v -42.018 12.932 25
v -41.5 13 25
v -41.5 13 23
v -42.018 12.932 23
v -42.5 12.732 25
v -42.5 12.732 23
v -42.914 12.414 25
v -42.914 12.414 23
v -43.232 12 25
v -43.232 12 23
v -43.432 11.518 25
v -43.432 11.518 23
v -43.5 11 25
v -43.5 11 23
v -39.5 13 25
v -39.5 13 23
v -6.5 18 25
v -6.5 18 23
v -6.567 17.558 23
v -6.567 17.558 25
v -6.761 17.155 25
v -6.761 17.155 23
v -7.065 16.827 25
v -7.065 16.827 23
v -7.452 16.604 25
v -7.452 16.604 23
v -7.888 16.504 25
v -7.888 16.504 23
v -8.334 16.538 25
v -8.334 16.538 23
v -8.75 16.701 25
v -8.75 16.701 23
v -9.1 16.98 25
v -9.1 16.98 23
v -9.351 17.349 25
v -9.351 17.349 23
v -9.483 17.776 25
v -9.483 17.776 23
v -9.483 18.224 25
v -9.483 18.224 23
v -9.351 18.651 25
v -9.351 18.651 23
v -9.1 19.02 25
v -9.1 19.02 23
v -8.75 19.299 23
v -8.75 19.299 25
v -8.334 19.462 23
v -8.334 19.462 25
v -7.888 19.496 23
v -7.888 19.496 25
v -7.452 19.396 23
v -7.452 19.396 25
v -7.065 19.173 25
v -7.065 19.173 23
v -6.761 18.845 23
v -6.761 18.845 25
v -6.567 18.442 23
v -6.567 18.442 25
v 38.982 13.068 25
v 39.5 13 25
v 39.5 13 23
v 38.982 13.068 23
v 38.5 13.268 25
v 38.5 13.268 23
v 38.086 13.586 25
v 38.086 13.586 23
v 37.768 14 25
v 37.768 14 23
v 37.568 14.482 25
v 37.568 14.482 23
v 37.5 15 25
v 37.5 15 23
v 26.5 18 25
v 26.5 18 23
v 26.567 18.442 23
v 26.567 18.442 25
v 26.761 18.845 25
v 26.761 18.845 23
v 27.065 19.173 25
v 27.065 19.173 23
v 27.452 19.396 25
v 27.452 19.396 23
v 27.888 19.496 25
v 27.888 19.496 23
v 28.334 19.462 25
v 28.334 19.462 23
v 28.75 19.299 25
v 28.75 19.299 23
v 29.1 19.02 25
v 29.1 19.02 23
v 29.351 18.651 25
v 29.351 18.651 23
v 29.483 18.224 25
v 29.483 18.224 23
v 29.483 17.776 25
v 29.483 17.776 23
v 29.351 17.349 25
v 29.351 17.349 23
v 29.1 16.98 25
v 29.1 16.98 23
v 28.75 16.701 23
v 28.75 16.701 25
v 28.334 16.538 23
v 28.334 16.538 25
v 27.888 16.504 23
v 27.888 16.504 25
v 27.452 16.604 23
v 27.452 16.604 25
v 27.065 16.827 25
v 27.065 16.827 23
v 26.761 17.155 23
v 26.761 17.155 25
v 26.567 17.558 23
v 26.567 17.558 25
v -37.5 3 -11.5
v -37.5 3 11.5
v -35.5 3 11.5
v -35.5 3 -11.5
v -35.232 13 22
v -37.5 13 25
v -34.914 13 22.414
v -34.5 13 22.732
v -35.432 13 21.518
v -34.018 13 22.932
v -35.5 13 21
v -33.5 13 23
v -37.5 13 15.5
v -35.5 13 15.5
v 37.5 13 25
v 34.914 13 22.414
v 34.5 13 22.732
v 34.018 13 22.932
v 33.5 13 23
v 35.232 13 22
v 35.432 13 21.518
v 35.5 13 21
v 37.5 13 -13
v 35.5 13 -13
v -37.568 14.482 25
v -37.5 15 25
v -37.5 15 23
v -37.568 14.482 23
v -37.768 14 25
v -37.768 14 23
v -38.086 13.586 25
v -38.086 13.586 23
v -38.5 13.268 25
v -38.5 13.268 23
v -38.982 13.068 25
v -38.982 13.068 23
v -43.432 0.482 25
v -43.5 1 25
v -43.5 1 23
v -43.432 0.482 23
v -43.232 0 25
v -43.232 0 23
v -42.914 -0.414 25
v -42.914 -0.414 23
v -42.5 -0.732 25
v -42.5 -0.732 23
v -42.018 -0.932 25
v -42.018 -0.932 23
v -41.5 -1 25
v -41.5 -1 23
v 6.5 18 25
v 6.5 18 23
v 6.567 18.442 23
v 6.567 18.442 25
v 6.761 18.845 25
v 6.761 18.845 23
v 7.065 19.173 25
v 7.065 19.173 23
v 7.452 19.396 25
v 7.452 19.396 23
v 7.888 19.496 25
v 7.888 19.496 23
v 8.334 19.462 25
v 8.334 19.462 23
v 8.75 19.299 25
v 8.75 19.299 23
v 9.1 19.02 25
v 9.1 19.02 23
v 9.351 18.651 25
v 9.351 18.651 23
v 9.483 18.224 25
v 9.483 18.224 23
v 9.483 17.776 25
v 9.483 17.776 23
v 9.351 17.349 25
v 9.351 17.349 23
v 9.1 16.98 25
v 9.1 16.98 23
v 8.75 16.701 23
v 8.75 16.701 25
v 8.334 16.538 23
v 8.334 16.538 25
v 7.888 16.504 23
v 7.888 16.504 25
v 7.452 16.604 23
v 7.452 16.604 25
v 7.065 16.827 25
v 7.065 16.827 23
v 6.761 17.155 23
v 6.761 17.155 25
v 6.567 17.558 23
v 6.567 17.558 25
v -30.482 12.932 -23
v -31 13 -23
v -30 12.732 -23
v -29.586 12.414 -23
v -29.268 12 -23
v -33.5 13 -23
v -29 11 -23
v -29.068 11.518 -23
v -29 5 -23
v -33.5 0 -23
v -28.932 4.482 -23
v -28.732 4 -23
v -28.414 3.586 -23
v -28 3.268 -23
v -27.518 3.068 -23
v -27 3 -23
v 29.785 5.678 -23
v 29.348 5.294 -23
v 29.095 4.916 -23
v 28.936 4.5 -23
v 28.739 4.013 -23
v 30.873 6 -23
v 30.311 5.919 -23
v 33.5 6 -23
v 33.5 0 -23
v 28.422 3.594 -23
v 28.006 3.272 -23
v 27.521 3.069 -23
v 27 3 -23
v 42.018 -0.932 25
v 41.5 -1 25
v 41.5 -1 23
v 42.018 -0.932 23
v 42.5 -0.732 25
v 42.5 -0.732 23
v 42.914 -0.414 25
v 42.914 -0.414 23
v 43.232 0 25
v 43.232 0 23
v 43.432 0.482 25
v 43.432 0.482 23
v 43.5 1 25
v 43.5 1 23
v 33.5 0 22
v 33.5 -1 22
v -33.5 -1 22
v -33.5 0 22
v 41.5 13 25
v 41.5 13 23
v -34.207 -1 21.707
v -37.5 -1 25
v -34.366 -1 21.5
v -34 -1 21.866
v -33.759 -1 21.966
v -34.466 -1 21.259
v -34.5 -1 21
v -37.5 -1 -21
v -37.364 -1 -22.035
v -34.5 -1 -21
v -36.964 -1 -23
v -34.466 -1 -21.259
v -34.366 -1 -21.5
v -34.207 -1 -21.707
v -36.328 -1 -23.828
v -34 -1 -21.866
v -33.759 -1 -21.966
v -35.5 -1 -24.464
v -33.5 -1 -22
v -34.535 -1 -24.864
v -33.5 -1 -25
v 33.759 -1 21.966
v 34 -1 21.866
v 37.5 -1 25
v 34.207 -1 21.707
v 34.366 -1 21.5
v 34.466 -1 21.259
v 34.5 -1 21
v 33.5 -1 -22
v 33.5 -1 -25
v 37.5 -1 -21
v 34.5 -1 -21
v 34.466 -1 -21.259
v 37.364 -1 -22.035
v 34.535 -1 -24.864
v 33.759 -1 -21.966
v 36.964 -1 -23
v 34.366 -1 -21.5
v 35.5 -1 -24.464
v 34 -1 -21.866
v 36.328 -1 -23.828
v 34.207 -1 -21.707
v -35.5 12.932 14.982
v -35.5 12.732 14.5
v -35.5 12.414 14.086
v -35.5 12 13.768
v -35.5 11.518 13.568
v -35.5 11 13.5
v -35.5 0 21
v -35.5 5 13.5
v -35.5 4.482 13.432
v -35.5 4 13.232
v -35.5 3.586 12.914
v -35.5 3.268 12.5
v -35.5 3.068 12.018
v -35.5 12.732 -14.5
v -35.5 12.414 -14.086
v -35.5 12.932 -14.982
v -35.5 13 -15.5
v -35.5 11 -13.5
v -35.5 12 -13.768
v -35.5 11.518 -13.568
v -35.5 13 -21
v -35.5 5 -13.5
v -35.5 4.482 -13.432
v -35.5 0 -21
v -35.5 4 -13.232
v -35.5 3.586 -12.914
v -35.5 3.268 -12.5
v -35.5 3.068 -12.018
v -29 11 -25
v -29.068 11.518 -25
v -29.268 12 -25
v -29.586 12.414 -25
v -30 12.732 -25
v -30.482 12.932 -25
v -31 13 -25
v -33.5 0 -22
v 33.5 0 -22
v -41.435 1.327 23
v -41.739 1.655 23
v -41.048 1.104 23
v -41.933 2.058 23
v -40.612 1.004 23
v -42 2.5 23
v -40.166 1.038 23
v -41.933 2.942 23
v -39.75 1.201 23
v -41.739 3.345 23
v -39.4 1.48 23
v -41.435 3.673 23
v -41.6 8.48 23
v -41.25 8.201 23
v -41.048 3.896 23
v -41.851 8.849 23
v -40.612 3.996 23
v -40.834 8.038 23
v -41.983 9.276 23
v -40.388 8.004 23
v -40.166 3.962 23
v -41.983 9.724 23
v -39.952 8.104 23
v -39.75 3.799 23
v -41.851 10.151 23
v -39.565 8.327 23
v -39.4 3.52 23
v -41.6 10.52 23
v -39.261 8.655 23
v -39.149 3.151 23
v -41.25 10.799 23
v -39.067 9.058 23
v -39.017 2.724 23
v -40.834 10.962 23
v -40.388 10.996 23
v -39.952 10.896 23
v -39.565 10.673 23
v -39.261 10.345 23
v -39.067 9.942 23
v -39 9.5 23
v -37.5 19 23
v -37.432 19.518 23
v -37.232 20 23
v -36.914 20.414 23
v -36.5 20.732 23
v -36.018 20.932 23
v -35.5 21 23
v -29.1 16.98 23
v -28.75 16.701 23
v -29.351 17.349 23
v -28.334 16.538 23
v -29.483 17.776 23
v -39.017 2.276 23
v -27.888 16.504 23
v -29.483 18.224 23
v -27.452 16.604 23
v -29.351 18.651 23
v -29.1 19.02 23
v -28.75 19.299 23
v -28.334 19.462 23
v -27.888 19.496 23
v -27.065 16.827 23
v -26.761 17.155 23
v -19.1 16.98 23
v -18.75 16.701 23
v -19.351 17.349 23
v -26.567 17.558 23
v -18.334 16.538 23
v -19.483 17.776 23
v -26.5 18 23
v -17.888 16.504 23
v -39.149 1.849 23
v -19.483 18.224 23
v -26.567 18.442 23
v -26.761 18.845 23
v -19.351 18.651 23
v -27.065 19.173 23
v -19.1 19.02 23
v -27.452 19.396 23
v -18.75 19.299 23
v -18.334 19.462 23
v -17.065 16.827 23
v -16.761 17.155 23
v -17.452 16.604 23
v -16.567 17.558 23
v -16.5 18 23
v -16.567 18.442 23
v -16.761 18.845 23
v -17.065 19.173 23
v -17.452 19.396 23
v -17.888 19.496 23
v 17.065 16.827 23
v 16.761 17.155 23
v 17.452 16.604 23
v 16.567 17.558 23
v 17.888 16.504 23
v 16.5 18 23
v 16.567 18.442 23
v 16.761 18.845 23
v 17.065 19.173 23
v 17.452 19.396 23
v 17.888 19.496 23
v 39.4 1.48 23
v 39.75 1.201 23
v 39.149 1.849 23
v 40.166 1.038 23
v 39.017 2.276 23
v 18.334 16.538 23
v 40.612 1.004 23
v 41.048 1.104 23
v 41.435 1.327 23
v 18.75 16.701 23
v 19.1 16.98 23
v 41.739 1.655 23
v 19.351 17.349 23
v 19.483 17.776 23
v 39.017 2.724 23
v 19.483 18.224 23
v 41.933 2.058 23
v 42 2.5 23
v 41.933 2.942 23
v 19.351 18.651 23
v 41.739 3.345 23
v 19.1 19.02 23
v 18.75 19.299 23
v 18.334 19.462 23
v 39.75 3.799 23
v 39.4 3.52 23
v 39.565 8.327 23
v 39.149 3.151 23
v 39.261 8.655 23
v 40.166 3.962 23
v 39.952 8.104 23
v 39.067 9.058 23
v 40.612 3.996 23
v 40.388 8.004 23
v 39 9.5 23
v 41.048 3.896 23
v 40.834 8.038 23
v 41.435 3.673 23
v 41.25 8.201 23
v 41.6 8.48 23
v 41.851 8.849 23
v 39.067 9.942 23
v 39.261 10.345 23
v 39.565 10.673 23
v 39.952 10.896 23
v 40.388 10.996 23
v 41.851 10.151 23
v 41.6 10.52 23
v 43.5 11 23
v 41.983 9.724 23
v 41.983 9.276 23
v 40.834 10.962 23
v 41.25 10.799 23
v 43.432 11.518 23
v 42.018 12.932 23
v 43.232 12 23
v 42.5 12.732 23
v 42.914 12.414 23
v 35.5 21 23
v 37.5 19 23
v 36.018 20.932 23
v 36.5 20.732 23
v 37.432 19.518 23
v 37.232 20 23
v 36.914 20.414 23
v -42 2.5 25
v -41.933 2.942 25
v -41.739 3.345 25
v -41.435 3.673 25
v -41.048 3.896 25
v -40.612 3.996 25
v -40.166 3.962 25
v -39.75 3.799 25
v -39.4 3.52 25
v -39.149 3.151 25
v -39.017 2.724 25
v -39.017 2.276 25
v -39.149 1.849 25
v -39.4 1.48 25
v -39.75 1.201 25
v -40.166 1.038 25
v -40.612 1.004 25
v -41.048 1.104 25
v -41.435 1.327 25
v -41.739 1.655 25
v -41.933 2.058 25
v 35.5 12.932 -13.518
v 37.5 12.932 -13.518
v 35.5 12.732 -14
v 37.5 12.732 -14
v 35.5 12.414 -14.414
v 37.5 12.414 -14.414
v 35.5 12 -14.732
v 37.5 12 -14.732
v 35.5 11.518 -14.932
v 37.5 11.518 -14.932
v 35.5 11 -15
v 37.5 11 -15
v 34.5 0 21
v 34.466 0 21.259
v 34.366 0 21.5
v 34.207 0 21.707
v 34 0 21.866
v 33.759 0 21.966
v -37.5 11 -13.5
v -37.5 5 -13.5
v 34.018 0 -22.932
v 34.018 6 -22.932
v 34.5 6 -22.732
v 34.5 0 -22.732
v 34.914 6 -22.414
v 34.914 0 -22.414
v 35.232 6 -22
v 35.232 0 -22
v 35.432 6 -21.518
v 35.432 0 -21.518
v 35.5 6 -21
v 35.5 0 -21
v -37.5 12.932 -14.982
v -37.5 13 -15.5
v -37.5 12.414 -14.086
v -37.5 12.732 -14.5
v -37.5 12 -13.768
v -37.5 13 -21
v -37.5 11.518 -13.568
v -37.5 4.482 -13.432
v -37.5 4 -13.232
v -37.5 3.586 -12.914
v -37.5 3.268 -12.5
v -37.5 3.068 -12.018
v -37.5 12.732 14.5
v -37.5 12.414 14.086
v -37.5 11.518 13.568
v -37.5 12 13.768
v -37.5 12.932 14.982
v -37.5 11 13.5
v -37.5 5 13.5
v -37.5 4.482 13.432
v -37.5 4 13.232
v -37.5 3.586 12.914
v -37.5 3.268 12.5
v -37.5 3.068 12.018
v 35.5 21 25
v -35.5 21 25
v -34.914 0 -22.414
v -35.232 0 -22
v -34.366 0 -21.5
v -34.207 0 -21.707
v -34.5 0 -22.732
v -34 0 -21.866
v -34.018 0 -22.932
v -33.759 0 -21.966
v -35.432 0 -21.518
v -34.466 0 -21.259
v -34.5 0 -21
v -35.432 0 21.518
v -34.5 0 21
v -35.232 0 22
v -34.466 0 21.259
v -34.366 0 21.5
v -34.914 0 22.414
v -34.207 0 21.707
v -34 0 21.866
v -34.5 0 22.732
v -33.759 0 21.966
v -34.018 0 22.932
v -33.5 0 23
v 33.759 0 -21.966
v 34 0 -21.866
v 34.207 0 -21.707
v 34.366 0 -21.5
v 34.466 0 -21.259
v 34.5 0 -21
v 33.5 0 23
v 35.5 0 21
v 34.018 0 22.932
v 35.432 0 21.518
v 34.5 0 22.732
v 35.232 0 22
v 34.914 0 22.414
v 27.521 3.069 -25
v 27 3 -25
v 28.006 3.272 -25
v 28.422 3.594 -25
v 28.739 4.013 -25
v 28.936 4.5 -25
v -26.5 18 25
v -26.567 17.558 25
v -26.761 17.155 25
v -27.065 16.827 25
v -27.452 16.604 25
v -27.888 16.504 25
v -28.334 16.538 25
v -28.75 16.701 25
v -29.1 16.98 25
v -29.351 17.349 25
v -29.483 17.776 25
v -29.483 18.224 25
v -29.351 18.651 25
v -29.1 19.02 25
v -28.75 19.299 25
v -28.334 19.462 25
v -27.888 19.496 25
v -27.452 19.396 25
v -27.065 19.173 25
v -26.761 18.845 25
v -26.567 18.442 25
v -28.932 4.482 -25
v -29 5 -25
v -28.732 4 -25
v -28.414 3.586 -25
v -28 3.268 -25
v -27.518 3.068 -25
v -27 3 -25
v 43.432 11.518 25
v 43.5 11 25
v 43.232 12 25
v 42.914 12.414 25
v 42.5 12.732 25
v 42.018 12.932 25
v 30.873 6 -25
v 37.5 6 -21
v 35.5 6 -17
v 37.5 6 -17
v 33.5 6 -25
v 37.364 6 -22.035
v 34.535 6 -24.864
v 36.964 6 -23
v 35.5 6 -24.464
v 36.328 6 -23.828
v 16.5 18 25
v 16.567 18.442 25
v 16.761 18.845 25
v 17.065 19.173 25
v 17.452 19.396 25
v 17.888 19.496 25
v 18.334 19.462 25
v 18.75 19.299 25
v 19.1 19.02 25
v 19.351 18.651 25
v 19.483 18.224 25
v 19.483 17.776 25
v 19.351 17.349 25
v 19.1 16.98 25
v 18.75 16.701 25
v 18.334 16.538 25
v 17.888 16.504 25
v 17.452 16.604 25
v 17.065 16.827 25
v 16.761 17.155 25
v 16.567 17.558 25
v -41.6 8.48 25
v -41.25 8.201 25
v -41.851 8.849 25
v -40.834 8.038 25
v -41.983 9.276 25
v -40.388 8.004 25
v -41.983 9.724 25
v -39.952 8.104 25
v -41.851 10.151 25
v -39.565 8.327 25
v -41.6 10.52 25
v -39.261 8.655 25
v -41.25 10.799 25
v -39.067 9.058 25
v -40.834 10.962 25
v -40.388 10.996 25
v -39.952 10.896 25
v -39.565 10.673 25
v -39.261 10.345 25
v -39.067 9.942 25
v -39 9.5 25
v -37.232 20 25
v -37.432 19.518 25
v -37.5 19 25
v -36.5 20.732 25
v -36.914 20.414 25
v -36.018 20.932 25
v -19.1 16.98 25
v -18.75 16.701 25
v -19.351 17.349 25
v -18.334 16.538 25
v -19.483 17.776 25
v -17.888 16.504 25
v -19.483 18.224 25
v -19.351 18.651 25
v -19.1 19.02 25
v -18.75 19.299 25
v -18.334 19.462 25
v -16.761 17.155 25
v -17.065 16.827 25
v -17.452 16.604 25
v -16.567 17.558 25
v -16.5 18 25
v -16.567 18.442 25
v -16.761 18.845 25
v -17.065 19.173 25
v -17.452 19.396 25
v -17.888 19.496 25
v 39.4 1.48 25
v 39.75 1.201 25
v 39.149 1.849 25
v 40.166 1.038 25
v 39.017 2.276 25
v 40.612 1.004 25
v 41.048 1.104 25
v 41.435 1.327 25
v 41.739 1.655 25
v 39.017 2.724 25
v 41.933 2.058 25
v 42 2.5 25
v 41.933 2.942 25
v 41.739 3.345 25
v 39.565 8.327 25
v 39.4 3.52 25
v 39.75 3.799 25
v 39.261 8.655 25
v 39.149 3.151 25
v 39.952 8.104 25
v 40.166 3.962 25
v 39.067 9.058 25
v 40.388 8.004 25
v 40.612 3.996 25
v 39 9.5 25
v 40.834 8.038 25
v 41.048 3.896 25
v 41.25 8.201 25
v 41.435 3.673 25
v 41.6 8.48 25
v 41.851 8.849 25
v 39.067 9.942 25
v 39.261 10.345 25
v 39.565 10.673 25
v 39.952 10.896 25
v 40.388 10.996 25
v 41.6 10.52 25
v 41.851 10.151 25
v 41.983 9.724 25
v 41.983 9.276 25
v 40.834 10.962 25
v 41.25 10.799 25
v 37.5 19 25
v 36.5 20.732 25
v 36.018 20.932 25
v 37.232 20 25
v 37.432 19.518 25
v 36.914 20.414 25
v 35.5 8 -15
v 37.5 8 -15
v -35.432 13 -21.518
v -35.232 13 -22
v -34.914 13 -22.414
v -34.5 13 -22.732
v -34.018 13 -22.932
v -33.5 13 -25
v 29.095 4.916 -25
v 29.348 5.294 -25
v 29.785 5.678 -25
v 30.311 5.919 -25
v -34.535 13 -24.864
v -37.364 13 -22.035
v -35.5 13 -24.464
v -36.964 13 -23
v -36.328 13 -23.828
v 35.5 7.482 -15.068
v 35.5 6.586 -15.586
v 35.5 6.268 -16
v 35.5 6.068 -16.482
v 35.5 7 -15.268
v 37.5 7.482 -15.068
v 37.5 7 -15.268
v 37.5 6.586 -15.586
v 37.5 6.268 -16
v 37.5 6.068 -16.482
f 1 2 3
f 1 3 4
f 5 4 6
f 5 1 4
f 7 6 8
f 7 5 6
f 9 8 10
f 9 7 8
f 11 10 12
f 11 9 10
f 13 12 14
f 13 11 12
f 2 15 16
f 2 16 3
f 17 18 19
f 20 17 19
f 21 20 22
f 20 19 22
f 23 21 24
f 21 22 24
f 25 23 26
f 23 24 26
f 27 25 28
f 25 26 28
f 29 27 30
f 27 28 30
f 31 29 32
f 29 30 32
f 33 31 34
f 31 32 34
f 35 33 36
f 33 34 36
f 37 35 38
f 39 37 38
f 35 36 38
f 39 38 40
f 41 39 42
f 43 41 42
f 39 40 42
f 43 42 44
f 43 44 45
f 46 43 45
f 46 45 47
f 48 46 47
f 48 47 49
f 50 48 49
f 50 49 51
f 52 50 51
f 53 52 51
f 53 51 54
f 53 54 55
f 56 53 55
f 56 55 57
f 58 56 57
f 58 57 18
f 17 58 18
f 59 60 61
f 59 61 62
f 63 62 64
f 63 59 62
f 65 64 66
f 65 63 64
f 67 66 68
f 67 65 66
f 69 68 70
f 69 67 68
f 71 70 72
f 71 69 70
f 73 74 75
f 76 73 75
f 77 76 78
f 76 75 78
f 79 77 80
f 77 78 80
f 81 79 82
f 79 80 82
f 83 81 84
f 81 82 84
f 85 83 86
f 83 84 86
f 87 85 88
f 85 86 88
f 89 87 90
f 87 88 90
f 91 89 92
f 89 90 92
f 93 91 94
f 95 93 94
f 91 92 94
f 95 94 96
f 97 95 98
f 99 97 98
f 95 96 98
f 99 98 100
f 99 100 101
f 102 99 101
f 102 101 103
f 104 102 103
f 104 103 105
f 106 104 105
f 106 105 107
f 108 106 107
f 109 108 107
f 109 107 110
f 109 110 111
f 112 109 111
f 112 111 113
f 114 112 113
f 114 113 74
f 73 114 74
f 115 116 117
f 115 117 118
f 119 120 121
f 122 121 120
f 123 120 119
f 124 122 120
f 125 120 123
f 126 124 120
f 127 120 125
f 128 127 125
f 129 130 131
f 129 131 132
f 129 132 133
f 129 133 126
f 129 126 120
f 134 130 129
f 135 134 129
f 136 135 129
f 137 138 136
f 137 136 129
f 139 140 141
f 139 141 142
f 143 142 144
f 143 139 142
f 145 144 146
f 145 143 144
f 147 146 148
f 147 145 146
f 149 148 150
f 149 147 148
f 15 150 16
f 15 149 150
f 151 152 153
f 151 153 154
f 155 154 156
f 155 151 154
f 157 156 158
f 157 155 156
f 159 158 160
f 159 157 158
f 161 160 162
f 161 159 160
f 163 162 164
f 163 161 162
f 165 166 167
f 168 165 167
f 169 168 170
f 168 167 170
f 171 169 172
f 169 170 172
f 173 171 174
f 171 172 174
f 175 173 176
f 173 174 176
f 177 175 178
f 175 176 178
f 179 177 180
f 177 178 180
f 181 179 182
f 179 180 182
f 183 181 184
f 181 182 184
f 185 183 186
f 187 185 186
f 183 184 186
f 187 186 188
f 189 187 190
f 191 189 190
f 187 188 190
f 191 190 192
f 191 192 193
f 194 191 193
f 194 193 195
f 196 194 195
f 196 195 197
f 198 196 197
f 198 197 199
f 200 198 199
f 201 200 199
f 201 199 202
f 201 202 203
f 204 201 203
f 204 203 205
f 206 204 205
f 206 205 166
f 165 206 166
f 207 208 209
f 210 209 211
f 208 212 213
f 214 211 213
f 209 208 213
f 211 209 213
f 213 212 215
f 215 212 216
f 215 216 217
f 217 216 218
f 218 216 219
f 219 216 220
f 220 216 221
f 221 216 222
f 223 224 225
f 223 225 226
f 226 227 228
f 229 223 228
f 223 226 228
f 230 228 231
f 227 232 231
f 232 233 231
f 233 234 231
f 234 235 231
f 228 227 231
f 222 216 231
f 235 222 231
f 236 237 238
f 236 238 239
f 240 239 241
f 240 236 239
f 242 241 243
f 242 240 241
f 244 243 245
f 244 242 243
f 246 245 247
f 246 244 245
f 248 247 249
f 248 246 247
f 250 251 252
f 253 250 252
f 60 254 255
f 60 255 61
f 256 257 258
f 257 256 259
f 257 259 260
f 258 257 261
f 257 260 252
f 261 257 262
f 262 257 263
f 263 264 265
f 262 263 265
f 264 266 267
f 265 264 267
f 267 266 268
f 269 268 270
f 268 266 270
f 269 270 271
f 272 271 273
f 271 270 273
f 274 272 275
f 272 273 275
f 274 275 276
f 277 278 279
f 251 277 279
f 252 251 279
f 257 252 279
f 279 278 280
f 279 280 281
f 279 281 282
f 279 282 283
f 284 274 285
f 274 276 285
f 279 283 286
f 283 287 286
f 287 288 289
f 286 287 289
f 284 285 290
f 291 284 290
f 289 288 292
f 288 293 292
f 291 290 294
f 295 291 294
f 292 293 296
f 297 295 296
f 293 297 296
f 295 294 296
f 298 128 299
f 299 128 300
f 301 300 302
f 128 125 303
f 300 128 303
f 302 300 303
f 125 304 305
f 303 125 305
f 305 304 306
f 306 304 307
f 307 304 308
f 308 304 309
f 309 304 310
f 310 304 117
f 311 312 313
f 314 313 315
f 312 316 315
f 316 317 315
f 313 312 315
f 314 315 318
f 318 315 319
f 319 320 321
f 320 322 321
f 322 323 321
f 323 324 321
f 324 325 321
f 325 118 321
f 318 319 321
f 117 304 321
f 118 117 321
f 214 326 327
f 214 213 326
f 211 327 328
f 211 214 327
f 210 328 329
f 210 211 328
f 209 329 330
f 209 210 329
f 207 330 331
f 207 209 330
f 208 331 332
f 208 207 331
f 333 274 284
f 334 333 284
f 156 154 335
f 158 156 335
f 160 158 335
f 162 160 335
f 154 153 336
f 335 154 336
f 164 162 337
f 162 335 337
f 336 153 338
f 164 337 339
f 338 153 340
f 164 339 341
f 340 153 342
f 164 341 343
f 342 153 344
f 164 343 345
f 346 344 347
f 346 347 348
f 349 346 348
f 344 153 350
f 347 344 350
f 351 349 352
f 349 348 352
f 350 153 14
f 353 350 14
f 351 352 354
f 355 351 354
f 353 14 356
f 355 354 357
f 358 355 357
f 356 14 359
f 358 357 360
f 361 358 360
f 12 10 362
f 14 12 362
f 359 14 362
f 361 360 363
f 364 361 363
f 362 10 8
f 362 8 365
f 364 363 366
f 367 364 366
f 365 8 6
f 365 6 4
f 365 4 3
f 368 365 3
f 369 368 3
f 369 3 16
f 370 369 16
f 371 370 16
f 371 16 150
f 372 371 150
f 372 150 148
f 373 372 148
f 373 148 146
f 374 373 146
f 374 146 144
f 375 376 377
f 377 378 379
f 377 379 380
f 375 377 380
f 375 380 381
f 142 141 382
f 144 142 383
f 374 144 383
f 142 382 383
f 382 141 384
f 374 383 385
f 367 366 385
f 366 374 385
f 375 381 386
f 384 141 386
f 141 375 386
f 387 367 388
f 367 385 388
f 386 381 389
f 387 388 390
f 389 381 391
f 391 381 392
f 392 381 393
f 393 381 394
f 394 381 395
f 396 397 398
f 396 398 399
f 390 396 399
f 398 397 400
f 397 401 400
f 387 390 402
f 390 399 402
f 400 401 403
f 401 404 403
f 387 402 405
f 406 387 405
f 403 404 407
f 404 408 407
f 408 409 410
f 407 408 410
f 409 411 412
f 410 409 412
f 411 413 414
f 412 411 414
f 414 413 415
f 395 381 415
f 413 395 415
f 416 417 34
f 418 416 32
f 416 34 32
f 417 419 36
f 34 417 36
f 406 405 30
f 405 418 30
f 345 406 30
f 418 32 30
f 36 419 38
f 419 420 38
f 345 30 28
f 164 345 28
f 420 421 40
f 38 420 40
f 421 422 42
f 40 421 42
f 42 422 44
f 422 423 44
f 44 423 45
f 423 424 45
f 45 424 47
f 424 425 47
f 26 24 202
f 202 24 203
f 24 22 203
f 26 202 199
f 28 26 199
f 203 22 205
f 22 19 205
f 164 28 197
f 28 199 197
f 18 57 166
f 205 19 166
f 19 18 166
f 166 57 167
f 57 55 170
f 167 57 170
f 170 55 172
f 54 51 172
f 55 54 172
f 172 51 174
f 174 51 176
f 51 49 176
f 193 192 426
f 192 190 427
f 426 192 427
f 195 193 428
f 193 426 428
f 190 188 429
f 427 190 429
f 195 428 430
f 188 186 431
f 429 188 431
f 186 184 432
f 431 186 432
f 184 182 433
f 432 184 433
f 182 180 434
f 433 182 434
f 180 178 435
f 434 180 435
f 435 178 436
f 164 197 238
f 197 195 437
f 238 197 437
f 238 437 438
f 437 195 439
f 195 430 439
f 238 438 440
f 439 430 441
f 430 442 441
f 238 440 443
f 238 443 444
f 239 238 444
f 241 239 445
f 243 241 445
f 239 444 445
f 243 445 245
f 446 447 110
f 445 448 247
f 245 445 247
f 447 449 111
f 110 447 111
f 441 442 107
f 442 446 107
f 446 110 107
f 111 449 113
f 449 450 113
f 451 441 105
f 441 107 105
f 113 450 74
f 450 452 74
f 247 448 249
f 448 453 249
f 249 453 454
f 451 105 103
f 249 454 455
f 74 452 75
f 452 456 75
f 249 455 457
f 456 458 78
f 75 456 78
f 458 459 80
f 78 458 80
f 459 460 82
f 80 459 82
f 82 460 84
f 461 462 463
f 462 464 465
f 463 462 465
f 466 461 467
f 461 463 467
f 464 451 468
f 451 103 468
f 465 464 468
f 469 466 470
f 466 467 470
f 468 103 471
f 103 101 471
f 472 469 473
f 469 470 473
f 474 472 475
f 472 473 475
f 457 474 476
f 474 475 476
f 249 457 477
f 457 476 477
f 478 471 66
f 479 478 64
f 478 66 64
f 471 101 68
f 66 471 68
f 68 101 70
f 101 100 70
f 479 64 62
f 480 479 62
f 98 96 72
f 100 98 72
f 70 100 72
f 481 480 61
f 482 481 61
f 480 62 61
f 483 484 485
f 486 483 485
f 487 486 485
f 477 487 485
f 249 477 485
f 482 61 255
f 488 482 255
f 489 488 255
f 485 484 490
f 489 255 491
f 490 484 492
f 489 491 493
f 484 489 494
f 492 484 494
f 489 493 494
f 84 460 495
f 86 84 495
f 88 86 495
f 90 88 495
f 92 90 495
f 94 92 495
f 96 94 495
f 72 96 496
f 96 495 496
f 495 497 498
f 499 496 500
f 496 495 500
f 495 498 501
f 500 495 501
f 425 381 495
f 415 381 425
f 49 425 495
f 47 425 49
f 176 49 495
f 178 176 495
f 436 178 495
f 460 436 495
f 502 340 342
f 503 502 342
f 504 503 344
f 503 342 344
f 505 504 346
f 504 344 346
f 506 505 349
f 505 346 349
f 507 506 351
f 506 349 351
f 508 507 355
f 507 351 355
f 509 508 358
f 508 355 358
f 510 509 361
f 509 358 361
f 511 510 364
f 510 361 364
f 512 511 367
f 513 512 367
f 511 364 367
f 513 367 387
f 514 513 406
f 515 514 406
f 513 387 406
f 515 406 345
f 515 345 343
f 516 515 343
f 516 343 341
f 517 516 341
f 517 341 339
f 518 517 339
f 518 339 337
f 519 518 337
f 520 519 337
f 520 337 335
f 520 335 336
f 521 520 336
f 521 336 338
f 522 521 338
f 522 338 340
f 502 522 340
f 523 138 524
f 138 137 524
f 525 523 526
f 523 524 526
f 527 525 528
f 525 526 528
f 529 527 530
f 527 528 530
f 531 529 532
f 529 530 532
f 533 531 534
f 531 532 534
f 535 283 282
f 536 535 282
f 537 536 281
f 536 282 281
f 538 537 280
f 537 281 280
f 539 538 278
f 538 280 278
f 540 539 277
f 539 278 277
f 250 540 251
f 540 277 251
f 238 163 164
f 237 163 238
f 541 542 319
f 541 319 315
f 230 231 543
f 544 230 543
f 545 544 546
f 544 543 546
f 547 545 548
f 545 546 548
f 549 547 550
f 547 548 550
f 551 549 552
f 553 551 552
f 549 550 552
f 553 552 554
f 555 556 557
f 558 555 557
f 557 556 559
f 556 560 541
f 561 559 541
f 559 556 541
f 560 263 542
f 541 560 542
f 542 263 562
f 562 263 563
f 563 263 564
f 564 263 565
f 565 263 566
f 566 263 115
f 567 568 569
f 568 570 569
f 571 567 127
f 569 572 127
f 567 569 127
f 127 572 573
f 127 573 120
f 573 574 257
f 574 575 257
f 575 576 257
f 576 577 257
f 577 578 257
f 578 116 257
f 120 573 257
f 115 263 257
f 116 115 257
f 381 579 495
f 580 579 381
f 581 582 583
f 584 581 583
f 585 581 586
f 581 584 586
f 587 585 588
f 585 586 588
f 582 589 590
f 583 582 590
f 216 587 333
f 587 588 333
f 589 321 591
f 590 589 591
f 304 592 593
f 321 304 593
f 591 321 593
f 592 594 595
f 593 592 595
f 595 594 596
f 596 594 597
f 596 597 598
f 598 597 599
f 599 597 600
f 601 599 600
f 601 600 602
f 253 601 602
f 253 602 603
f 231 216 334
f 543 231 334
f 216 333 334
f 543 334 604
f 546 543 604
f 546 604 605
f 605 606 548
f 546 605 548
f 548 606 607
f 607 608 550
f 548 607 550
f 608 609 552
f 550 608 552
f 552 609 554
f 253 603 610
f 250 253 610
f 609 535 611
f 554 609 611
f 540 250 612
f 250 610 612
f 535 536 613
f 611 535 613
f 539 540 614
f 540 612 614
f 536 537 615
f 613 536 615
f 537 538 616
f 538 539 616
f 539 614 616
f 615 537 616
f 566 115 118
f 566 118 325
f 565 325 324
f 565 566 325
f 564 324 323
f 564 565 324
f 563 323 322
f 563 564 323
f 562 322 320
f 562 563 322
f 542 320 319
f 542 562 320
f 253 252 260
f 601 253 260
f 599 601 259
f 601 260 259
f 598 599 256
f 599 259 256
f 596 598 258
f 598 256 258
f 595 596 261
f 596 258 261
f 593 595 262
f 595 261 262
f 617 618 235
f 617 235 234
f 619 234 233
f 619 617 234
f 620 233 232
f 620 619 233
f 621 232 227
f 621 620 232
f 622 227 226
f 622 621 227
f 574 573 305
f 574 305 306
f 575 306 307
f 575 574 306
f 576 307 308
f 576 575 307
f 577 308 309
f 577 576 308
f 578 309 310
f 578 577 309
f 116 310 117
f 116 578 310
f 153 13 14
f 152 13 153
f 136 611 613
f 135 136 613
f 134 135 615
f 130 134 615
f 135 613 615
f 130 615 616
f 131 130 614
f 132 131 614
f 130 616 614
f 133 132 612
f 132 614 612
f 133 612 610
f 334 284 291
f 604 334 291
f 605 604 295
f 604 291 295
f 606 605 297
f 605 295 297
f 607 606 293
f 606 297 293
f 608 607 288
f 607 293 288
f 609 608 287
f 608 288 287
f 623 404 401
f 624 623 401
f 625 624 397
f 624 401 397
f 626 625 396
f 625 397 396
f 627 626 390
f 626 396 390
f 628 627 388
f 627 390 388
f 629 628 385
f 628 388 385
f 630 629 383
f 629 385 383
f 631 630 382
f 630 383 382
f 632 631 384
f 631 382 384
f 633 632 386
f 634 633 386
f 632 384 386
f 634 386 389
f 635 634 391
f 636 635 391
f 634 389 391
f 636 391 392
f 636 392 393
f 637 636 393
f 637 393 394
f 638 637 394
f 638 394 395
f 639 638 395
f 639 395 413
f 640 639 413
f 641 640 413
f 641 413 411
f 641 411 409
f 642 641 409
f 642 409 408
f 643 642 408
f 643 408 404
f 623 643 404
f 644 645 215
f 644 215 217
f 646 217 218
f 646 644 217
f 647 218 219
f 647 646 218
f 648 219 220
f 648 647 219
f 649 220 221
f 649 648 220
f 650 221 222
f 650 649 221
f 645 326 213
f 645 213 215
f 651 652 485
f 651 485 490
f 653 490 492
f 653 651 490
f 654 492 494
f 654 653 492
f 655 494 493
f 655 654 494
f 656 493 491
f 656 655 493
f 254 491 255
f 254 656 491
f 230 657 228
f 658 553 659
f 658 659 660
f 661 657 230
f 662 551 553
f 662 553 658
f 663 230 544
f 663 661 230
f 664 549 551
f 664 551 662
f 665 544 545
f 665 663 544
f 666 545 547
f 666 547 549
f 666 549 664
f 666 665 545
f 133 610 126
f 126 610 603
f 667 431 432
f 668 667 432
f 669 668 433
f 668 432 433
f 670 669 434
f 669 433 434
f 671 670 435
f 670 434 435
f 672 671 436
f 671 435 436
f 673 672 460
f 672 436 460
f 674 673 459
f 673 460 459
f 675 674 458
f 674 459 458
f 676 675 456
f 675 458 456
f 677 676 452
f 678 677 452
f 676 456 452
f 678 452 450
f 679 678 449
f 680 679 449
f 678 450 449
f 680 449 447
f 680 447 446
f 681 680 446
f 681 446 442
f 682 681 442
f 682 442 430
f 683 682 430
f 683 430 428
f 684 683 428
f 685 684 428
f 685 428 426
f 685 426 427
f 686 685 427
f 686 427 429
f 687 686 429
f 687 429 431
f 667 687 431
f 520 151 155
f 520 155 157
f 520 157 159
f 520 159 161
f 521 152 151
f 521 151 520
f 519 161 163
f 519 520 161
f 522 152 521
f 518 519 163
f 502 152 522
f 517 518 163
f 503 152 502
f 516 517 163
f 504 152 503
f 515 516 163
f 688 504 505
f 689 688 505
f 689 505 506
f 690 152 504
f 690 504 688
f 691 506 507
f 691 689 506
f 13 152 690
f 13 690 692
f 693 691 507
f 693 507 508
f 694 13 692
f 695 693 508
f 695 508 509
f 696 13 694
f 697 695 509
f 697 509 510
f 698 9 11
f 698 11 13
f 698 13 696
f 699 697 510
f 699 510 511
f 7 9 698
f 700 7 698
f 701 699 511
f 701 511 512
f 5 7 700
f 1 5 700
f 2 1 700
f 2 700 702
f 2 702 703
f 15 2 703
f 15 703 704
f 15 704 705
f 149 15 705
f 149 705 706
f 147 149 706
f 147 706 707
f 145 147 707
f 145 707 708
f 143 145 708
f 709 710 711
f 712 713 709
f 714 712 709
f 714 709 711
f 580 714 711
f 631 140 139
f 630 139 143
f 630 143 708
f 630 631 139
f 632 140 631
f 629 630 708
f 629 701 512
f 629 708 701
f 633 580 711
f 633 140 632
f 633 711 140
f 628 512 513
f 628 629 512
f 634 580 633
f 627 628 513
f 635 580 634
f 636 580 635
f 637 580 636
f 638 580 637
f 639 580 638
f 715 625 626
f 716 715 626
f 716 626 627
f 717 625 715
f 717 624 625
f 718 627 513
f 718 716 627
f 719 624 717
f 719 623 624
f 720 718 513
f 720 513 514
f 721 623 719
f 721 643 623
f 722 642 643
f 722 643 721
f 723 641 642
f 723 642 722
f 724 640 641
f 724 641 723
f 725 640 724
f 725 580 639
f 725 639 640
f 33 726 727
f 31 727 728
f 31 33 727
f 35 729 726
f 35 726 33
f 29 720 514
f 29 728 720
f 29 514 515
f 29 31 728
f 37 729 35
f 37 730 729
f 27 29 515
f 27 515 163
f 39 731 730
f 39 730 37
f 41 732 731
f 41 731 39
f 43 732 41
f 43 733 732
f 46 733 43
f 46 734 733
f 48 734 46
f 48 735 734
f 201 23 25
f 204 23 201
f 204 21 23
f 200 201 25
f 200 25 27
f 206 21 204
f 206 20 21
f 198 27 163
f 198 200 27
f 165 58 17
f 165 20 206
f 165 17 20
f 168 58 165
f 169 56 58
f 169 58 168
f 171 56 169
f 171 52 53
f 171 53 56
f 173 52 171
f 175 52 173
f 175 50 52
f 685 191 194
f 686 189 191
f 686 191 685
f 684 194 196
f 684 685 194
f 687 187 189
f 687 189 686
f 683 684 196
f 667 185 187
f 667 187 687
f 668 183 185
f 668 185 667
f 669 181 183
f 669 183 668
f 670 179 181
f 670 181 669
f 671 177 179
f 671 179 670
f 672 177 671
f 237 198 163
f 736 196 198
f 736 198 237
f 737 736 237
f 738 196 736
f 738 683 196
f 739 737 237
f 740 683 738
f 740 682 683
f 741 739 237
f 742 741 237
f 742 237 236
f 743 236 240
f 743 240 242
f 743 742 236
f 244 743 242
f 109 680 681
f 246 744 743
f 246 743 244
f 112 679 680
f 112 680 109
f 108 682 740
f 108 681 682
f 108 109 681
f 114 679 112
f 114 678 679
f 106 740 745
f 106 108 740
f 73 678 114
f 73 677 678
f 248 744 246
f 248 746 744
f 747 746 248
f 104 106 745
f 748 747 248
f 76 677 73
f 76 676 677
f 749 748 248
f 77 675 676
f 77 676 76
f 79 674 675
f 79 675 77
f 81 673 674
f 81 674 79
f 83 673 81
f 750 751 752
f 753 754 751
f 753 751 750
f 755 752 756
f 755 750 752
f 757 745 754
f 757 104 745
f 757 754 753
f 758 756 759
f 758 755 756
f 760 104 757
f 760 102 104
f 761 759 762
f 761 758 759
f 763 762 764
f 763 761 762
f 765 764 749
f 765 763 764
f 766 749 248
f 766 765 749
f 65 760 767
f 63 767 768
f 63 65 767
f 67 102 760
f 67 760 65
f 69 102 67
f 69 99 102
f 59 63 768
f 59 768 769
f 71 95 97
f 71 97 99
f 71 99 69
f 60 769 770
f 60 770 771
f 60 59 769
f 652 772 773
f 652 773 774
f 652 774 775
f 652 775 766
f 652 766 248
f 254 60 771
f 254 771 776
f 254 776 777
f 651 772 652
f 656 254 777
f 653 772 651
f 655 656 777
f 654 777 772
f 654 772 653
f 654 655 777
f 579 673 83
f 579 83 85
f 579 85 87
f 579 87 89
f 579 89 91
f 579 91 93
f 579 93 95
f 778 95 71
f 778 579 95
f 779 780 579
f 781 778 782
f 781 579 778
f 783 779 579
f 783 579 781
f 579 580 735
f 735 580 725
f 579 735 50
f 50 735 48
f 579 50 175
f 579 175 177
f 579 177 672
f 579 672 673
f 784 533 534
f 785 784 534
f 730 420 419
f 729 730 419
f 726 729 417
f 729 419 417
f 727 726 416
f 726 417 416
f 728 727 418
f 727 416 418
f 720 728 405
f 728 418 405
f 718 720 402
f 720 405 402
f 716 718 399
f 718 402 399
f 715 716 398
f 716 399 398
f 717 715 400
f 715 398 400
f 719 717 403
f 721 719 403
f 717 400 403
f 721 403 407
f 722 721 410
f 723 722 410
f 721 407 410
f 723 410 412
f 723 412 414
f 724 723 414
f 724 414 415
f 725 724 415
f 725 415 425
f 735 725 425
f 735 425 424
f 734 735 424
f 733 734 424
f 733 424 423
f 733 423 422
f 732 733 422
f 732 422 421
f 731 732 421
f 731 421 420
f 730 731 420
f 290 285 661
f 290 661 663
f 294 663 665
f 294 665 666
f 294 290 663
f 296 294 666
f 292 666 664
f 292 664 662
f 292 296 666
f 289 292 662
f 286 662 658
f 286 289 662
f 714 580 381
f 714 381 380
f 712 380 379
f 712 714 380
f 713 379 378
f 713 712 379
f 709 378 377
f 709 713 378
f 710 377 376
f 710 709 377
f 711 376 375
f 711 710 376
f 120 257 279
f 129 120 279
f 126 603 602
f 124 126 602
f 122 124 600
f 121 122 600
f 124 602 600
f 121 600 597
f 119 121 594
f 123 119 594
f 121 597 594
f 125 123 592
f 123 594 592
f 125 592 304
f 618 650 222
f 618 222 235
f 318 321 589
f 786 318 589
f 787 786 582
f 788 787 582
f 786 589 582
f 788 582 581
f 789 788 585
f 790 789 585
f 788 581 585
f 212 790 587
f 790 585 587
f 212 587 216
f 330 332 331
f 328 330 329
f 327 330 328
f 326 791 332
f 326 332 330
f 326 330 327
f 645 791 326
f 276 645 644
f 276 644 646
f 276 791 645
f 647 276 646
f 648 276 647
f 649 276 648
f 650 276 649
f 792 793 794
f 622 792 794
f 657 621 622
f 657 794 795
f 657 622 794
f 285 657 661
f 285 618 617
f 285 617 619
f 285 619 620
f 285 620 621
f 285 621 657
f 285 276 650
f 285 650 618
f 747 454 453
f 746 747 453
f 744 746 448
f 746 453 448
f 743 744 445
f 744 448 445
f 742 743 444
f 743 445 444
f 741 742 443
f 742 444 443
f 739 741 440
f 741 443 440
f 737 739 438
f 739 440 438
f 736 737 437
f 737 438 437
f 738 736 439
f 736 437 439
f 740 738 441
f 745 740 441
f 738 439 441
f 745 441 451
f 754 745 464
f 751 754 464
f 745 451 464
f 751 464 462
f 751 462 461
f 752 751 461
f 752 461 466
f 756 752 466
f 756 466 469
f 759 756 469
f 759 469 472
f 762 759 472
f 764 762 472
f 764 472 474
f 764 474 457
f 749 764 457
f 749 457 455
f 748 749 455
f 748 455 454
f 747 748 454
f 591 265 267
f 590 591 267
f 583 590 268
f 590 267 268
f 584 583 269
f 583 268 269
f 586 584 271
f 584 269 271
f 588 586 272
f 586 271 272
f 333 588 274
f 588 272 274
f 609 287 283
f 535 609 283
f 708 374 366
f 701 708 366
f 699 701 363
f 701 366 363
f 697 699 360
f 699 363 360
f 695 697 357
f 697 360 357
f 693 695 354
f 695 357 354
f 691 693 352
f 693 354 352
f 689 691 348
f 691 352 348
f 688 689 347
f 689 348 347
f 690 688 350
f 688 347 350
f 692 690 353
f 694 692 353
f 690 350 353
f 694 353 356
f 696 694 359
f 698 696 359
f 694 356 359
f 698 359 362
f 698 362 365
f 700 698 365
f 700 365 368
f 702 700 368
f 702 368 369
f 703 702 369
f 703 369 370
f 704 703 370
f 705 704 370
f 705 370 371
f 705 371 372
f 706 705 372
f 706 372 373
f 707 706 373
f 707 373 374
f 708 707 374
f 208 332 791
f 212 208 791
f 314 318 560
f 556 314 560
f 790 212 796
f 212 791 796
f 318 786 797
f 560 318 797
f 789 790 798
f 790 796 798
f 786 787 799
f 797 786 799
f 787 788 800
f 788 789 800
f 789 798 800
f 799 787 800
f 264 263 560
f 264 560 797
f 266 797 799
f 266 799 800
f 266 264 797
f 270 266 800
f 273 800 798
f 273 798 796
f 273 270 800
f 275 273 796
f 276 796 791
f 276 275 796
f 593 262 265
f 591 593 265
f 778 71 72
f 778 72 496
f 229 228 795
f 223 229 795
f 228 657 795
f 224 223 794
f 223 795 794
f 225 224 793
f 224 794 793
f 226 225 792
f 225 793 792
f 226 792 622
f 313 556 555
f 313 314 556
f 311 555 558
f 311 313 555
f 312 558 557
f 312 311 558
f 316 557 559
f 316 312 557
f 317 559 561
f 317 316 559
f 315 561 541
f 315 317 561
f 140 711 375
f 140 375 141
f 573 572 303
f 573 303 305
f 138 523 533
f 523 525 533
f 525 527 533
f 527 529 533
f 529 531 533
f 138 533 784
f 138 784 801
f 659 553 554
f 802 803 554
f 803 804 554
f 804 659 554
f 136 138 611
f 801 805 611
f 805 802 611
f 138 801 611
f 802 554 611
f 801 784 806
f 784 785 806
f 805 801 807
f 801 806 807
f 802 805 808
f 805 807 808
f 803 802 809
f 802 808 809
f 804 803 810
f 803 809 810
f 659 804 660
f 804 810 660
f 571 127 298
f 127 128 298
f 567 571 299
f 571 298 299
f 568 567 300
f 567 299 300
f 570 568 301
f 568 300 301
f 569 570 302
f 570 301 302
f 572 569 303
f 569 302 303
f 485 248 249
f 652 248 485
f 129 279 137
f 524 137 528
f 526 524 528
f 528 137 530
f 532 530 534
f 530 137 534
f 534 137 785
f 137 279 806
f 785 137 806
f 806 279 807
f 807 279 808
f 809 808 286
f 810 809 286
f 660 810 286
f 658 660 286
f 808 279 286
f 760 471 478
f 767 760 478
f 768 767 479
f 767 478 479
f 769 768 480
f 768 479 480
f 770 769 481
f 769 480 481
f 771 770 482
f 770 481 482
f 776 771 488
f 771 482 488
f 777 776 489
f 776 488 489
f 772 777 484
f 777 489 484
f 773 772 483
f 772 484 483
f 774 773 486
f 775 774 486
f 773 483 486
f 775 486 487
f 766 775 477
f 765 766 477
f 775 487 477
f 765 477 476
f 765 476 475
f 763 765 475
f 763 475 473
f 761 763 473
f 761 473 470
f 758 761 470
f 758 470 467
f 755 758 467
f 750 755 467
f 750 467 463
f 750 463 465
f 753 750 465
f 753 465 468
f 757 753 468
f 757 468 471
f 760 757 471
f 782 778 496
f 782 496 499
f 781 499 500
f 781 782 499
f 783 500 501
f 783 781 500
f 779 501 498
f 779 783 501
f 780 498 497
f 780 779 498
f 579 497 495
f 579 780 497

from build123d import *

# Parameters (mm, degrees)
EXTRUDE_THIN1_DEPTH = 13
CUT_EXTRUDE1_REACH  = 65.838
BOSS_EXTRUDE2_START = 1
BOSS_EXTRUDE2_DEPTH = 1
CUT_EXTRUDE2_REACH  = 82.119
SKETCH5_W           = 8.5
SKETCH5_H           = 10
CUT_EXTRUDE3_DEPTH  = 7
FILLET1_R           = 2
DELETEFACE1_START   = -1
DELETEFACE1_DEPTH   = 14
SKETCH7_W           = 75
SKETCH7_H           = 14
BOSS_EXTRUDE3_DEPTH = 2
SKETCH8_R           = 1.5
CUT_EXTRUDE4_DEPTH  = 10


# Read off the part's stored shape, not the designer's step: DeleteFace1
with BuildPart() as part:
    # Sketch1 → Extrude-Thin1 (new body)
    with BuildSketch(Plane(origin=(0, 0, 0), x_dir=(1, 0, 0), z_dir=(0, 1, 0))):
        with BuildLine():
            Line((33.5, -25), (-33.5, -25))
            ThreePointArc((-33.5, -25), (-36.328427125, -23.828427125), (-37.5, -21))
            Line((-37.5, -21), (-37.5, 21))
            ThreePointArc((-37.5, 21), (-36.328427125, 23.828427125), (-33.5, 25))
            Line((-33.5, 25), (33.5, 25))
            ThreePointArc((33.5, 25), (36.328427125, 23.828427125), (37.5, 21))
            Line((37.5, 21), (37.5, -21))
            ThreePointArc((37.5, -21), (36.328427125, -23.828427125), (33.5, -25))
        make_face()
        with BuildLine():
            Line((33.5, -23), (-33.5, -23))
            ThreePointArc((-33.5, -23), (-34.914213562, -22.414213562), (-35.5, -21))
            Line((-35.5, -21), (-35.5, 21))
            ThreePointArc((-35.5, 21), (-34.914213562, 22.414213562), (-33.5, 23))
            Line((-33.5, 23), (33.5, 23))
            ThreePointArc((33.5, 23), (34.914213562, 22.414213562), (35.5, 21))
            Line((35.5, 21), (35.5, -21))
            ThreePointArc((35.5, -21), (34.914213562, -22.414213562), (33.5, -23))
        make_face(mode=Mode.SUBTRACT)
    extrude(amount=EXTRUDE_THIN1_DEPTH)

    # Sketch2 → Cut-Extrude1 (cut, up to next)
    with BuildSketch(Plane(origin=(0, 0, -25), x_dir=(-1, 0, 0), z_dir=(0, 0, -1)), mode=Mode.PRIVATE) as cut_extrude1_sk1:
        with BuildLine():
            Line((-29, 13), (29, 13))
            Line((29, 13), (29, 5))
            ThreePointArc((29, 5), (28.414213562, 3.585786438), (27, 3))
            Line((27, 3), (-27, 3))
            ThreePointArc((-27, 3), (-28.414213562, 3.585786438), (-29, 5))
            Line((-29, 5), (-29, 13))
        make_face()
    cut_extrude1_tool1 = extrude(cut_extrude1_sk1.sketch, amount=-CUT_EXTRUDE1_REACH, mode=Mode.PRIVATE) & part.part
    add(cut_extrude1_tool1.solids().sort_by_distance((0, 8.013518, -25))[0], mode=Mode.SUBTRACT)

    # Sketch3 → Boss-Extrude2 (add)
    with BuildSketch(Plane.XZ.offset(BOSS_EXTRUDE2_START)):
        with BuildLine():
            Line((37.5, -21), (37.5, 21))
            ThreePointArc((37.5, 21), (36.328427125, 23.828427125), (33.5, 25))
            Line((33.5, 25), (-33.5, 25))
            ThreePointArc((-33.5, 25), (-36.328427125, 23.828427125), (-37.5, 21))
            Line((-37.5, 21), (-37.5, -21))
            ThreePointArc((-37.5, -21), (-36.328427125, -23.828427125), (-33.5, -25))
            Line((-33.5, -25), (33.5, -25))
            ThreePointArc((33.5, -25), (36.328427125, -23.828427125), (37.5, -21))
        make_face()
        with BuildLine():
            Line((34.5, -21), (34.5, 21))
            ThreePointArc((34.5, 21), (34.207106781, 21.707106781), (33.5, 22))
            Line((33.5, 22), (-33.5, 22))
            ThreePointArc((-33.5, 22), (-34.207106781, 21.707106781), (-34.5, 21))
            Line((-34.5, 21), (-34.5, -21))
            ThreePointArc((-34.5, -21), (-34.207106781, -21.707106781), (-33.5, -22))
            Line((-33.5, -22), (33.5, -22))
            ThreePointArc((33.5, -22), (34.207106781, -21.707106781), (34.5, -21))
        make_face(mode=Mode.SUBTRACT)
    extrude(amount=-BOSS_EXTRUDE2_DEPTH)

    # Sketch4 → Cut-Extrude2 (cut, up to next)
    with BuildSketch(Plane.ZY.offset(37.5), mode=Mode.PRIVATE) as cut_extrude2_sk1:
        with BuildLine():
            Line((-13.5, 13), (13.5, 13))
            Line((13.5, 13), (13.5, 5))
            ThreePointArc((13.5, 5), (12.914213562, 3.585786438), (11.5, 3))
            Line((11.5, 3), (-11.5, 3))
            ThreePointArc((-11.5, 3), (-12.914213562, 3.585786438), (-13.5, 5))
            Line((-13.5, 5), (-13.5, 13))
        make_face()
    cut_extrude2_tool1 = extrude(cut_extrude2_sk1.sketch, amount=-CUT_EXTRUDE2_REACH, mode=Mode.PRIVATE) & part.part
    add(cut_extrude2_tool1.solids().sort_by_distance((-37.5, 8.029138, 0))[0], mode=Mode.SUBTRACT)

    # Sketch5 → Cut-Extrude3 (cut)
    with BuildSketch(Plane(origin=(0, 13, 0), x_dir=(1, 0, 0), z_dir=(0, 1, 0))):
        with Locations((33.25, 20)):
            Rectangle(SKETCH5_W, SKETCH5_H)
    extrude(amount=-CUT_EXTRUDE3_DEPTH, mode=Mode.SUBTRACT)

    # Fillet1
    fillet1_edges = [part.edges().sort_by_distance(p)[0] for p in [
        (-29, 13, -24),
        (29, 6, -24),
        (-36.5, 13, 13.5),
        (-36.5, 13, -13.5),
        (36.5, 6, -15),
        (36.5, 13, -15),
    ]]
    fillet(fillet1_edges, radius=FILLET1_R)

    # DeleteFace1 outline → DeleteFace1 (add)
    with BuildSketch(Plane(origin=(0, 0, 0), x_dir=(1, 0, 0), z_dir=(0, 1, 0)).offset(DELETEFACE1_START)):
        with BuildLine():
            Line((-37.5, -25), (-33.5, -25))
            ThreePointArc((-33.5, -25), (-36.328427125, -23.828427125), (-37.5, -21))
            Line((-37.5, -21), (-37.5, -25))
        make_face()
        with BuildLine():
            ThreePointArc((37.5, -21), (36.328427125, -23.828427125), (33.5, -25))
            Line((33.5, -25), (37.5, -25))
            Line((37.5, -25), (37.5, -21))
        make_face()
    extrude(amount=DELETEFACE1_DEPTH)


with BuildPart() as body_2:
    # Sketch7 → Boss-Extrude3 (new body)
    with BuildSketch(Plane.XY.offset(25)):
        with BuildLine():
            Line((-39.5, 13), (-41.5, 13))
            ThreePointArc((-41.5, 13), (-42.914213562, 12.414213562), (-43.5, 11))
            Line((-43.5, 11), (-43.5, 1))
            ThreePointArc((-43.5, 1), (-42.914213562, -0.414213562), (-41.5, -1))
            Line((-41.5, -1), (-37.5, -1))
            Line((-37.5, -1), (-37.5, 13))
            Line((-37.5, 13), (0, 13))
            Line((0, 13), (37.5, 13))
            Line((37.5, 13), (39.5, 13))
            ThreePointArc((39.5, 13), (38.085786438, 13.585786438), (37.5, 15))
            Line((37.5, 15), (37.5, 19))
            ThreePointArc((37.5, 19), (36.914213562, 20.414213562), (35.5, 21))
            Line((35.5, 21), (-35.5, 21))
            ThreePointArc((-35.5, 21), (-36.914213562, 20.414213562), (-37.5, 19))
            Line((-37.5, 19), (-37.5, 15))
            ThreePointArc((-37.5, 15), (-38.085786438, 13.585786438), (-39.5, 13))
        make_face()
        with Locations((0, 6)):
            Rectangle(SKETCH7_W, SKETCH7_H)
        with BuildLine():
            Line((37.5, 13), (37.5, -1))
            Line((37.5, -1), (41.5, -1))
            ThreePointArc((41.5, -1), (42.914213562, -0.414213562), (43.5, 1))
            Line((43.5, 1), (43.5, 11))
            ThreePointArc((43.5, 11), (42.914213562, 12.414213562), (41.5, 13))
            Line((41.5, 13), (39.5, 13))
            Line((39.5, 13), (37.5, 13))
        make_face()
    extrude(amount=-BOSS_EXTRUDE3_DEPTH)

    # Sketch8 → Cut-Extrude4 (cut)
    with BuildSketch(Plane(origin=(0, 0, 23), x_dir=(-1, 0, 0), z_dir=(0, 0, -1))):
        with Locations((-40.5, 9.5)):
            Circle(SKETCH8_R)
        with Locations(Location((-40.5, 2.5, 0), (0, 0, 180))):
            Circle(SKETCH8_R)
        with Locations(Location((40.5, 9.5, 0), (0, 0, 180))):
            Circle(SKETCH8_R)
        with Locations((40.5, 2.5)):
            Circle(SKETCH8_R)
        with Locations(Location((8, 18, 0), (0, 0, 180))):
            Circle(SKETCH8_R)
        with Locations(Location((18, 18, 0), (0, 0, 180))):
            Circle(SKETCH8_R)
        with Locations((-8, 18)):
            Circle(SKETCH8_R)
        with Locations((-18, 18)):
            Circle(SKETCH8_R)
        with Locations((-28, 18)):
            Circle(SKETCH8_R)
        with Locations(Location((28, 18, 0), (0, 0, 180))):
            Circle(SKETCH8_R)
    extrude(amount=-CUT_EXTRUDE4_DEPTH, mode=Mode.SUBTRACT)


solid = Compound([part.part, body_2.part])
